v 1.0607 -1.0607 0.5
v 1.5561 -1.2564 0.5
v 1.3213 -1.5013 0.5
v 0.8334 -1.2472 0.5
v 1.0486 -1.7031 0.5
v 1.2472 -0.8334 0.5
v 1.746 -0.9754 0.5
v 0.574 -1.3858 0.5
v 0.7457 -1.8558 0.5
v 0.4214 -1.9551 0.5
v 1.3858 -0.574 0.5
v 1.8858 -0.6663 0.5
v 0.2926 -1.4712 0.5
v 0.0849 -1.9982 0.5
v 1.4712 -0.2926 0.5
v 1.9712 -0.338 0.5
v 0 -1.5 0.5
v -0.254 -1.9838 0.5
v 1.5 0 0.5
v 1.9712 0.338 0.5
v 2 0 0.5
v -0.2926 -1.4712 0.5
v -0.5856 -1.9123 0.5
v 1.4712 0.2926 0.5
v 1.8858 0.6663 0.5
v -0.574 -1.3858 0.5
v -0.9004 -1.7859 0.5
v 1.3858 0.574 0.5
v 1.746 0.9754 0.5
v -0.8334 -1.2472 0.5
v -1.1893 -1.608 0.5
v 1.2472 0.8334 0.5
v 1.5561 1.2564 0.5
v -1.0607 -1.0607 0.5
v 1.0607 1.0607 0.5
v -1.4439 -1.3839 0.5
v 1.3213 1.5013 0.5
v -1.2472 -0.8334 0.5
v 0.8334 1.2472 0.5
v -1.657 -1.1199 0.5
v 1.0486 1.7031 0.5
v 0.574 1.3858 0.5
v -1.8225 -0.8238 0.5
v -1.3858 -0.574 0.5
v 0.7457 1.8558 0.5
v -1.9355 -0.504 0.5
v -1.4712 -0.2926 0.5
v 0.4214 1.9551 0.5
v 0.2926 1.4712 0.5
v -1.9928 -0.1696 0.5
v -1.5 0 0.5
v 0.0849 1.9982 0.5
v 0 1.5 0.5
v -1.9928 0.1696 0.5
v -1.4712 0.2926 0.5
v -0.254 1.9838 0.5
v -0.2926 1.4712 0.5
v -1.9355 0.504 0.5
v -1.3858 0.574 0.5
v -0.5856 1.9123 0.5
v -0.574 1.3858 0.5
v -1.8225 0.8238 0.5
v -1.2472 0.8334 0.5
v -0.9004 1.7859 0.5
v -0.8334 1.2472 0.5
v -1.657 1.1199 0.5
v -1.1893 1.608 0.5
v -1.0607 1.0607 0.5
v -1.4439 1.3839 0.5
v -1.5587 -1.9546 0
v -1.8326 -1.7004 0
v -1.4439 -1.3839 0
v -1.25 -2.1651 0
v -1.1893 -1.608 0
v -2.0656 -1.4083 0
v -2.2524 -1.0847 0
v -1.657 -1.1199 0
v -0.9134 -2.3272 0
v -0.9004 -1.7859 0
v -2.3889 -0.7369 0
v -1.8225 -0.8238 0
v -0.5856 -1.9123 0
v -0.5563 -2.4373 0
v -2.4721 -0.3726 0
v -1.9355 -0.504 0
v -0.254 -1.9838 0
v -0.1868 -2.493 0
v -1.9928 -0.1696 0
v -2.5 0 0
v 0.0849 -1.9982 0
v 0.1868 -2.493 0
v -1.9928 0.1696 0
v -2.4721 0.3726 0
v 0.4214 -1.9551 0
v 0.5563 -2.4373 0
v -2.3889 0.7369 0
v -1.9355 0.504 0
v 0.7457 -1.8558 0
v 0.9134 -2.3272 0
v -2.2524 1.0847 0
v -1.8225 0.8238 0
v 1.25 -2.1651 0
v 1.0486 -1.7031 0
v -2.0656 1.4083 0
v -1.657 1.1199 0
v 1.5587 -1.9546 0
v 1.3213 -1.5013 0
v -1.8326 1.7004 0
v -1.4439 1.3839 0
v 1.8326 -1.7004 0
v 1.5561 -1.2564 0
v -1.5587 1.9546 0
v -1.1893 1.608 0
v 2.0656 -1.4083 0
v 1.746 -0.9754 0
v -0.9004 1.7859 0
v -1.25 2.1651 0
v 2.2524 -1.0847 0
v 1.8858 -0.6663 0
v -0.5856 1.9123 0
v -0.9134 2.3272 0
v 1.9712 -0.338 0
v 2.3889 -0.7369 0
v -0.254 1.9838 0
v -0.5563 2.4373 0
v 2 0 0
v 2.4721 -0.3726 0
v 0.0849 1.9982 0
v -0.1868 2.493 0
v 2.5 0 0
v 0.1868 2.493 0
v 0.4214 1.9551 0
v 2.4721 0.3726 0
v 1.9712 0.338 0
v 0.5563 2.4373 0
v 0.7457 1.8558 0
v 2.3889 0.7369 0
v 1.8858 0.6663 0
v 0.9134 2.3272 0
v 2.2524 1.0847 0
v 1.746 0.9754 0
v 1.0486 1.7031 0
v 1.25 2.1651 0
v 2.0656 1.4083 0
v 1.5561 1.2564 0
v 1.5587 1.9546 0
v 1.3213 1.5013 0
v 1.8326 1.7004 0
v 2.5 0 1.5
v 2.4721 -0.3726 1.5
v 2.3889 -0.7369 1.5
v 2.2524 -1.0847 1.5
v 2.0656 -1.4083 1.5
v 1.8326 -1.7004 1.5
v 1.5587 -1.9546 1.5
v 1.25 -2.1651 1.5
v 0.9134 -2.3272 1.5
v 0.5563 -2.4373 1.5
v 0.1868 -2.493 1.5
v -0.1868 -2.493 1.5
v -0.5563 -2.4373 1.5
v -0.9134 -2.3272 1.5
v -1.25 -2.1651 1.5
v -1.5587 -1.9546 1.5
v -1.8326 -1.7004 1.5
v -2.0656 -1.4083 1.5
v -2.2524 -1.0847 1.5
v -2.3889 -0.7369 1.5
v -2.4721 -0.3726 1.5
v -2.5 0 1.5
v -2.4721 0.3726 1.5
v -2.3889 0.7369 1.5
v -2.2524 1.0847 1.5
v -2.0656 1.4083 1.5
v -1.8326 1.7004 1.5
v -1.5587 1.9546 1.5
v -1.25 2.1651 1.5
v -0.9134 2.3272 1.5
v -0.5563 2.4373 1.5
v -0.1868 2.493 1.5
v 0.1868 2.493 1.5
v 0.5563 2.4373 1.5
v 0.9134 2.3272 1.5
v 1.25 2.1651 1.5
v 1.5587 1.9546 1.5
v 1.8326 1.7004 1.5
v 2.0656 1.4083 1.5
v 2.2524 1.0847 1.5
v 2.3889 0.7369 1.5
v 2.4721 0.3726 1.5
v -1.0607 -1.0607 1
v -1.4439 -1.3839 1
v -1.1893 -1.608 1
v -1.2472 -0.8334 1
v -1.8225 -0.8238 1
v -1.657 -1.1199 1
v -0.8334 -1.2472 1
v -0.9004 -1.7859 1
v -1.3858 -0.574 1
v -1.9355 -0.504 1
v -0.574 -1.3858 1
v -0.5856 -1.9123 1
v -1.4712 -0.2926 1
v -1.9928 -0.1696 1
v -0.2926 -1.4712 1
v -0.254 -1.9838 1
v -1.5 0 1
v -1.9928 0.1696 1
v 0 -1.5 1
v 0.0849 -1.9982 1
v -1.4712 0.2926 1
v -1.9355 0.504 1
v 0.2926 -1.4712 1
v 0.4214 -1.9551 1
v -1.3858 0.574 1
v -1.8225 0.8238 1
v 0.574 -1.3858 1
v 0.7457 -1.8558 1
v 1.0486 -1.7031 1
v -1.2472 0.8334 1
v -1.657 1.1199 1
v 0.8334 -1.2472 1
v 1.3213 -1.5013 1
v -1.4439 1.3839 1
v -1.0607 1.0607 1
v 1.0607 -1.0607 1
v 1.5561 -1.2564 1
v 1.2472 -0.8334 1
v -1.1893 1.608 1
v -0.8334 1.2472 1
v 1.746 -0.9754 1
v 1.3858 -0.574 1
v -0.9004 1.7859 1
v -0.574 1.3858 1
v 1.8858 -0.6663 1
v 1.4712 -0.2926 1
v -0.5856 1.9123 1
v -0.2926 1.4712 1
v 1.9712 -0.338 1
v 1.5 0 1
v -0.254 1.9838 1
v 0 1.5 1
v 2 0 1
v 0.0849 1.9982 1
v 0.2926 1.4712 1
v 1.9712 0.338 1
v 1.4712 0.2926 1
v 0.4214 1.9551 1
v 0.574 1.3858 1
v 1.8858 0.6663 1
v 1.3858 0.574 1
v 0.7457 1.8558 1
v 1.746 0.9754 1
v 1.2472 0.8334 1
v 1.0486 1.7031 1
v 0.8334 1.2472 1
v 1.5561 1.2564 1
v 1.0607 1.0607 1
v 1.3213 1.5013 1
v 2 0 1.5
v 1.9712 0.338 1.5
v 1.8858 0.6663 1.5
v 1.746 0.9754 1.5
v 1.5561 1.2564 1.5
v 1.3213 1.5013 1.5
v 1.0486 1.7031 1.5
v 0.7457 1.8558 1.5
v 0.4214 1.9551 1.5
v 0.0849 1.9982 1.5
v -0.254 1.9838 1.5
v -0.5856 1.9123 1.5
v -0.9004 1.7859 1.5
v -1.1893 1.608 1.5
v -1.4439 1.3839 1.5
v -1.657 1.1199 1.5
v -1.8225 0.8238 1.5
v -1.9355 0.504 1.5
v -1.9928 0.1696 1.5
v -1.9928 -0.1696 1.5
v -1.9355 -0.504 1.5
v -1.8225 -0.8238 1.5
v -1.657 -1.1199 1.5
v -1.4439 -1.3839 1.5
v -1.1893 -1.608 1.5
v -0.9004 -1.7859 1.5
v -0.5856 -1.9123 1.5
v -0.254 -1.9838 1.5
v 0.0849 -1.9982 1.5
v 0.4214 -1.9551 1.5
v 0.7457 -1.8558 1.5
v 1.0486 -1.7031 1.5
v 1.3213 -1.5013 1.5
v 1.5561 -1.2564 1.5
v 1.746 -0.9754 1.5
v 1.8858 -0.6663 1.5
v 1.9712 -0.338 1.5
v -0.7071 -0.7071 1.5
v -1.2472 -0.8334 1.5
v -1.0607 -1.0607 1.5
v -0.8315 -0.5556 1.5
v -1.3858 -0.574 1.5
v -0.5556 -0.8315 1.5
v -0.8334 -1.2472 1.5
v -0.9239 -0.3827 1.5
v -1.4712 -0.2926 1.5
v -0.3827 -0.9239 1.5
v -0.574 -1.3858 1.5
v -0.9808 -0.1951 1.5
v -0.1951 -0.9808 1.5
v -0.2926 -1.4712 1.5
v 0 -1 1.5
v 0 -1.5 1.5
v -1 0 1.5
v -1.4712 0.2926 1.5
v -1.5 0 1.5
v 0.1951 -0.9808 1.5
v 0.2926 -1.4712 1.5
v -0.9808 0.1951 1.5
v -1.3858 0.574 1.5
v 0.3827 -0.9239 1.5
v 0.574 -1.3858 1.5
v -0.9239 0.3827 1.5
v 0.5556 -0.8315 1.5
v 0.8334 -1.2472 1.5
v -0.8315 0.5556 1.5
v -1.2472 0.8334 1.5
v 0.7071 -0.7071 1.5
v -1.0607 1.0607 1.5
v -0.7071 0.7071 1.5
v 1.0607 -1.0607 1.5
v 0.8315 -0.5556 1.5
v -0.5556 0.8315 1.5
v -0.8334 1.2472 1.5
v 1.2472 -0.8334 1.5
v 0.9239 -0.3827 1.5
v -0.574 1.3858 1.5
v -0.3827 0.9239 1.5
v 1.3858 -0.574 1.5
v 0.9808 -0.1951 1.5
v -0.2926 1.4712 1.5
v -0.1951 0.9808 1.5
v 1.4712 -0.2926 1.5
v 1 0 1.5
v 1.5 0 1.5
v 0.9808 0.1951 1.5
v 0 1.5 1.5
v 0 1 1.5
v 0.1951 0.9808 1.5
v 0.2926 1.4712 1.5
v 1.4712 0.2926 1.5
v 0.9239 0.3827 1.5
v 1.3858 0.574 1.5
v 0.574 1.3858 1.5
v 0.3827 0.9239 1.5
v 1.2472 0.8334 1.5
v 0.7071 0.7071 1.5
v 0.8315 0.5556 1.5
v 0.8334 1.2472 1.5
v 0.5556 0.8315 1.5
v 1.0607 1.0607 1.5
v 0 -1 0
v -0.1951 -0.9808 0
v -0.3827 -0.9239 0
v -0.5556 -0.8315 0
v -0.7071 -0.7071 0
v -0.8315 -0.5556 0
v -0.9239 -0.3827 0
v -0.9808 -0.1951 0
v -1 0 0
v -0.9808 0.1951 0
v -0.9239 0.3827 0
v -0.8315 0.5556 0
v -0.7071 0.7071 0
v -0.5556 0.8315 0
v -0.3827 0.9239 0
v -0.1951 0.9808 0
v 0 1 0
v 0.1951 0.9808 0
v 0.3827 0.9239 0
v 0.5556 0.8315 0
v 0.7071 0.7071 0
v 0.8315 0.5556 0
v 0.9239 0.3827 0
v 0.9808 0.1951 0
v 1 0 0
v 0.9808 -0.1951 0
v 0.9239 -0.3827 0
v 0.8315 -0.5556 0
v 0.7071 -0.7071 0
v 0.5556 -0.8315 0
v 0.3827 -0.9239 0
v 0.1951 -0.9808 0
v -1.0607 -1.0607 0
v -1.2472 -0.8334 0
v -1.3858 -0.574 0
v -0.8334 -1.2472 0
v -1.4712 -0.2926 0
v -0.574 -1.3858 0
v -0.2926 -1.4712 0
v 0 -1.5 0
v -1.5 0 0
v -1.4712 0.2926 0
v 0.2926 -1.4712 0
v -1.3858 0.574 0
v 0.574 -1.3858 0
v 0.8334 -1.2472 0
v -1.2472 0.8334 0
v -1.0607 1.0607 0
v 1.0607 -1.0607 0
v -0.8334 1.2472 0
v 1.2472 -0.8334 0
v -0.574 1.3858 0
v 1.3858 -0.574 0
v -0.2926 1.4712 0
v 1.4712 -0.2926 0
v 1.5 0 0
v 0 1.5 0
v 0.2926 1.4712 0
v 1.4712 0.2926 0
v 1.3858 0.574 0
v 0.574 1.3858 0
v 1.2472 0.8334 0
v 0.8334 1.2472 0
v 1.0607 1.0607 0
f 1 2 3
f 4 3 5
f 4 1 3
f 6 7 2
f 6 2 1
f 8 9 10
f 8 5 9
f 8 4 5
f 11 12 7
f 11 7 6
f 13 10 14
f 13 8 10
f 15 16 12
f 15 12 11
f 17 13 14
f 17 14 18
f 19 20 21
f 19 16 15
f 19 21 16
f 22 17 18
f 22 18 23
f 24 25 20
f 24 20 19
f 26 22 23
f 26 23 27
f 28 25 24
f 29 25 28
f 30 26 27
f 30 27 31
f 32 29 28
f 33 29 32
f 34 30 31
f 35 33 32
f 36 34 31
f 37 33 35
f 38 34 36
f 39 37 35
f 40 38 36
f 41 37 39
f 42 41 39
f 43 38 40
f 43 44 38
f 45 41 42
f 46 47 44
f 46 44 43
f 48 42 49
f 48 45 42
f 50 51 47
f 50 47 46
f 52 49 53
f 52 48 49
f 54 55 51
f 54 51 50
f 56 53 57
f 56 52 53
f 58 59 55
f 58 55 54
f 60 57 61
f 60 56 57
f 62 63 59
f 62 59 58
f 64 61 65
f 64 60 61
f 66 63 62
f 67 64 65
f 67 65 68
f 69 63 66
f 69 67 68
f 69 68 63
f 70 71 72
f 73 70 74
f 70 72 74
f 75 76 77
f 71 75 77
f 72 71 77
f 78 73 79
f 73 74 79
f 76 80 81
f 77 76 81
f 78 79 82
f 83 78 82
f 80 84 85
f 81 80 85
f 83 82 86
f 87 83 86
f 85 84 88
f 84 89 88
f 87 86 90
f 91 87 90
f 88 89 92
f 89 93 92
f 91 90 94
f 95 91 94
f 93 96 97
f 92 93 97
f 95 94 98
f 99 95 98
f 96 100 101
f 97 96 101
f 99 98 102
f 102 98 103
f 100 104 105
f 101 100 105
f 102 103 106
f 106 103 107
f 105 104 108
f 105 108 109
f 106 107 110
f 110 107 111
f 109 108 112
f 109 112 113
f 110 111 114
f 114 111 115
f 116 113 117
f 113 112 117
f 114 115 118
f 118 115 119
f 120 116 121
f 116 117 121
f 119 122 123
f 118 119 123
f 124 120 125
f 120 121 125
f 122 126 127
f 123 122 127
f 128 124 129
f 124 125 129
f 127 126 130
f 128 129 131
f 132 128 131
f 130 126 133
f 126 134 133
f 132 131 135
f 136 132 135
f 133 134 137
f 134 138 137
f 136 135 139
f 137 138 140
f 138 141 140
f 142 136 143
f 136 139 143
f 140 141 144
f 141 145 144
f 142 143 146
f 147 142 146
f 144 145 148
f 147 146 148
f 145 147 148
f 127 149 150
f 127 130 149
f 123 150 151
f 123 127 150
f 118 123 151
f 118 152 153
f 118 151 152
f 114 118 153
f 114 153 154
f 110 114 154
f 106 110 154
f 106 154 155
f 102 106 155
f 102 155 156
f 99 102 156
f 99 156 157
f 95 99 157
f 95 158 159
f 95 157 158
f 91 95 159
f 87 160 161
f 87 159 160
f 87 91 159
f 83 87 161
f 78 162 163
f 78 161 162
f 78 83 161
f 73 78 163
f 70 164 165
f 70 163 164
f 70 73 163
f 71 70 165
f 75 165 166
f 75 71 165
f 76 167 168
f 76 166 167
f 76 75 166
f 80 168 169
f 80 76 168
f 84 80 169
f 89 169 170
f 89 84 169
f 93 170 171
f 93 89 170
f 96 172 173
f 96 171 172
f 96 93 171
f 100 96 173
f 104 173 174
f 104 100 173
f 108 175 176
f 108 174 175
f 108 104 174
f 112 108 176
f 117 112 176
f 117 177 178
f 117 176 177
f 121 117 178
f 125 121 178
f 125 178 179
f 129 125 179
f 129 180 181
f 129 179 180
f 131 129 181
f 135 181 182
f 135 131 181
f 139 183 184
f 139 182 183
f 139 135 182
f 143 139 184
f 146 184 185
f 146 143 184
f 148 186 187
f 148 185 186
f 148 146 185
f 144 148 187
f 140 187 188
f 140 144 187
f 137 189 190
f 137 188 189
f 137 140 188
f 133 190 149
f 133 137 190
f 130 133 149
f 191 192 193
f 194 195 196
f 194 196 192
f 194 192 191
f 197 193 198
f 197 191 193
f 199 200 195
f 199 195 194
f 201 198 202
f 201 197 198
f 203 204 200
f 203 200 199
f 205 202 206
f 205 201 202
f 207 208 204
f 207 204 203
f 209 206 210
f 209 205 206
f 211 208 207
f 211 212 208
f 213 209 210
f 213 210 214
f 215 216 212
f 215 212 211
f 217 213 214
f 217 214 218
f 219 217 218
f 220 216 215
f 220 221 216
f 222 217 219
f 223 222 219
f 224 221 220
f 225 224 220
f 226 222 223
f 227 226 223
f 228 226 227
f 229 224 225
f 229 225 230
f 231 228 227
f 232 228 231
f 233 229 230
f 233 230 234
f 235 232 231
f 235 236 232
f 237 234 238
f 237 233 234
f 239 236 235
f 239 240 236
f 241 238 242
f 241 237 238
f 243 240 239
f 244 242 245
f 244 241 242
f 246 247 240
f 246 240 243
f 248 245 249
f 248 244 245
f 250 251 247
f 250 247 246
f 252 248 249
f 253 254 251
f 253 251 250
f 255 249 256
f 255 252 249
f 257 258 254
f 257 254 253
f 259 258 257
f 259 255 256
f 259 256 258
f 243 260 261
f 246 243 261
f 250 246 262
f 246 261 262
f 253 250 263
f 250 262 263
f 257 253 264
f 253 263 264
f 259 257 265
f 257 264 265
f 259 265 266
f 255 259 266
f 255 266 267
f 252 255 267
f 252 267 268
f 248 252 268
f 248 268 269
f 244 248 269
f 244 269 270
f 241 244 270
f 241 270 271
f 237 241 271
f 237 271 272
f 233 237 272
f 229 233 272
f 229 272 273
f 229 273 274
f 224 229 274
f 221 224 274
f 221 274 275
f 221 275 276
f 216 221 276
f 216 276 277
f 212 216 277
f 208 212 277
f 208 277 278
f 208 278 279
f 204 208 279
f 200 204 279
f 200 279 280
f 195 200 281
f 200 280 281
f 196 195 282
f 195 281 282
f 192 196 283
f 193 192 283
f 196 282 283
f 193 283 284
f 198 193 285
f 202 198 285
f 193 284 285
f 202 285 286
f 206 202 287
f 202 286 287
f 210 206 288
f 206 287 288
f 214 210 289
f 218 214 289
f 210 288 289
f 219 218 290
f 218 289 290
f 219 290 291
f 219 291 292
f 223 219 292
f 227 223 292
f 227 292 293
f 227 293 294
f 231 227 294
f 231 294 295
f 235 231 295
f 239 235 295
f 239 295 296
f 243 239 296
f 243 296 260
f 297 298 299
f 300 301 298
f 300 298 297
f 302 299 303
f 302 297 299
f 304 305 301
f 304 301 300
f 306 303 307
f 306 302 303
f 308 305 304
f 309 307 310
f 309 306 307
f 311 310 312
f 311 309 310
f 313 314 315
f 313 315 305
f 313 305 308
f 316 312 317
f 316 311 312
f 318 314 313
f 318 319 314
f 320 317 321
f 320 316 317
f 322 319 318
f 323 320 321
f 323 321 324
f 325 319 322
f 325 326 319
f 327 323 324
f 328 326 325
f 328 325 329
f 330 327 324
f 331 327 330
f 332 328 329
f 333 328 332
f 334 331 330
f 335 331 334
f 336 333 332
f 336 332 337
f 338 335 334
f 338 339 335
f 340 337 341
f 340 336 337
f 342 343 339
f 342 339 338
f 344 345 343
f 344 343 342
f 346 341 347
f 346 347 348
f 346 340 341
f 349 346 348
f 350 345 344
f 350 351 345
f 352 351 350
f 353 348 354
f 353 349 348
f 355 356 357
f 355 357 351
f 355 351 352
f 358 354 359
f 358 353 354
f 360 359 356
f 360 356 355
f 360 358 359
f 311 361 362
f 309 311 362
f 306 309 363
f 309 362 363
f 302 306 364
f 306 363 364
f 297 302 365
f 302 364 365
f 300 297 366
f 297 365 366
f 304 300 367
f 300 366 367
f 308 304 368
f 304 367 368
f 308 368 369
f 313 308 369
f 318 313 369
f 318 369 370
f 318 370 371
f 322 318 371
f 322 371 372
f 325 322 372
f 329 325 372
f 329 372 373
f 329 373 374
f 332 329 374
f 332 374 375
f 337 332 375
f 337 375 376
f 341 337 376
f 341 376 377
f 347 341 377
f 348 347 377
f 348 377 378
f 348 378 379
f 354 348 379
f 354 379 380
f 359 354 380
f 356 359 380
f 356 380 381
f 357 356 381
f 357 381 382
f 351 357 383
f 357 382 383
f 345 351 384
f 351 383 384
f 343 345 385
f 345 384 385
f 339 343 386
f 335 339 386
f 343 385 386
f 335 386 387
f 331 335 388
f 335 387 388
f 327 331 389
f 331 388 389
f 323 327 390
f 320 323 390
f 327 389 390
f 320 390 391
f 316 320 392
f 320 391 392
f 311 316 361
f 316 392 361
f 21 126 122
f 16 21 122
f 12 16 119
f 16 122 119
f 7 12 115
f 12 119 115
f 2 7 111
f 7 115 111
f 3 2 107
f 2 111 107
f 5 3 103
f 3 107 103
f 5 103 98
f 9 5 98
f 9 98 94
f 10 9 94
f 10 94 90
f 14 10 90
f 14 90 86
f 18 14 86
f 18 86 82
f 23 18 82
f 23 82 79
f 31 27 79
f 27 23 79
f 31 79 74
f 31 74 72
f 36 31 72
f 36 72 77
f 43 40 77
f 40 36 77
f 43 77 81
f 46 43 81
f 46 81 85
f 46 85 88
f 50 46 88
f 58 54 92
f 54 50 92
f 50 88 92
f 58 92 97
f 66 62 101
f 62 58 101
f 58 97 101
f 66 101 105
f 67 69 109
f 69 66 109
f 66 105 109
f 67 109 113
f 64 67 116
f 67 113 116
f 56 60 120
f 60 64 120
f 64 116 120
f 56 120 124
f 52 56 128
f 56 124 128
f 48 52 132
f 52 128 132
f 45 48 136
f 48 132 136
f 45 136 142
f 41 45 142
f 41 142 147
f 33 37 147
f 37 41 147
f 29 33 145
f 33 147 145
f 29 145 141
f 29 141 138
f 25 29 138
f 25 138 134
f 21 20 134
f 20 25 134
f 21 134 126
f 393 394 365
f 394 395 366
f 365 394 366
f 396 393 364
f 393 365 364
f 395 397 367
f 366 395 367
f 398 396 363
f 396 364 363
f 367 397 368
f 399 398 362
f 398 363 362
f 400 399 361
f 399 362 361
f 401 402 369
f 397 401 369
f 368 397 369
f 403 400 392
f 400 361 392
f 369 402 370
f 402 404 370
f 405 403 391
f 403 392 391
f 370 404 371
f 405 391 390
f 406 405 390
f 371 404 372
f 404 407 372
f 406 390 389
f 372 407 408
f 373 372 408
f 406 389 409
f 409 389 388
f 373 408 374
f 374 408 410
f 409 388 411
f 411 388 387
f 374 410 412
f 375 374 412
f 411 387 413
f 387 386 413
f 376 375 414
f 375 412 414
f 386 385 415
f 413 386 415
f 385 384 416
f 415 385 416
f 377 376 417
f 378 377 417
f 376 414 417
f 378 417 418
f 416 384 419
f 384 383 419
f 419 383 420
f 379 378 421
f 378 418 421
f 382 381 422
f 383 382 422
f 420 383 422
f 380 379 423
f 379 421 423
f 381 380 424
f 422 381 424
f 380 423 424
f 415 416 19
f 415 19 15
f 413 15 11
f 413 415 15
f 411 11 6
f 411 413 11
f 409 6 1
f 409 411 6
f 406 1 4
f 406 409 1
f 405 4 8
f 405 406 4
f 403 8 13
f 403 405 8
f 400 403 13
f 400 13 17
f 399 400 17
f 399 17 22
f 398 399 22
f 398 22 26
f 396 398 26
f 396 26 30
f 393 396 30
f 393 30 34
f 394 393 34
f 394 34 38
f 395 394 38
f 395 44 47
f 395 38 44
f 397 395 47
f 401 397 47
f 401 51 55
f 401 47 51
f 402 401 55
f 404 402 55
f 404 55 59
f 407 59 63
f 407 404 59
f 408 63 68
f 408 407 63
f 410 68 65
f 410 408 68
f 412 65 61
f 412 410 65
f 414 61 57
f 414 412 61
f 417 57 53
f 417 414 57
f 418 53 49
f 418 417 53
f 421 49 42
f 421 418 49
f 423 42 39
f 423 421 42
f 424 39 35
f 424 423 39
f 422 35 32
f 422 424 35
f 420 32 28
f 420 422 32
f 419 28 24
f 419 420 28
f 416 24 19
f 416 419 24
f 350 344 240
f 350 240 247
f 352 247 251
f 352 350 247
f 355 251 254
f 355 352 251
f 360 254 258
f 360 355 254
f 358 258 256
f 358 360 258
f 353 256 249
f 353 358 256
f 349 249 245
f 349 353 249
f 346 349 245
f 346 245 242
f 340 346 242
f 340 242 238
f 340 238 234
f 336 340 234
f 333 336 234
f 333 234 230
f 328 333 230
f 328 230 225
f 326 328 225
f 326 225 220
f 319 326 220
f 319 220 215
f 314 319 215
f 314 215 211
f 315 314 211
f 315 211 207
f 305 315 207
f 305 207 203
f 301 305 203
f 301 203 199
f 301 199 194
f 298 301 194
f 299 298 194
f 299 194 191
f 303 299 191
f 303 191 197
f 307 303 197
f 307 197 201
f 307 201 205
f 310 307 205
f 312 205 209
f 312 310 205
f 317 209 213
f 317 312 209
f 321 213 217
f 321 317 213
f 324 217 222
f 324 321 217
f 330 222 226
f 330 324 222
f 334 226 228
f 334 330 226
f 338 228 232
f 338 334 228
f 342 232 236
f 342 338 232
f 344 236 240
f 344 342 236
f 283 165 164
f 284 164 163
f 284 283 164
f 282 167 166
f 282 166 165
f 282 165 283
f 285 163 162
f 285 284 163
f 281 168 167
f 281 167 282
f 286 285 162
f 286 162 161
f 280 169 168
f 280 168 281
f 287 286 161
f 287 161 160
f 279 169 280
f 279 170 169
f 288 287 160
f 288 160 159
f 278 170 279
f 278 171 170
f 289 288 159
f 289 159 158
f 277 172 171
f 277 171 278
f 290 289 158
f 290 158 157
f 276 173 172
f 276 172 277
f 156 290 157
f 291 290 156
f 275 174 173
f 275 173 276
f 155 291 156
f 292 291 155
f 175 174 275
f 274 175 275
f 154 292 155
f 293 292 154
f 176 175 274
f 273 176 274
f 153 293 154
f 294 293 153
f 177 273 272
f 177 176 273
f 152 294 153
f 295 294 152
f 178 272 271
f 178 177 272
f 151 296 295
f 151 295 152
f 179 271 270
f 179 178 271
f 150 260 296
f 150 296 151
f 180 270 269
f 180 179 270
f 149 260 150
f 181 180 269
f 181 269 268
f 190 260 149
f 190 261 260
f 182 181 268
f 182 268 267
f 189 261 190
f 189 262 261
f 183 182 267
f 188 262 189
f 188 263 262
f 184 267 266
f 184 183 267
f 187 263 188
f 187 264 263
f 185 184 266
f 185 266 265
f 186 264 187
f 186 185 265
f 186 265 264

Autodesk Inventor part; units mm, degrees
ref_plane "YZ Plane" through (0, 0, 0) normal (1, 0, 0) x (0, 1, 0)
ref_plane "XZ Plane" through (0, 0, 0) normal (0, 1, 0) x (-1, 0, 0)
sketch "Sketch1" plane through (0, 0, 0) normal (0, 0, 1) x (1, 0, 0)
  circle A0 centre (0, 0) radius 2.5
  dimension "d0" = 5
extrude "Extrusion1" add sketch "Sketch1" along normal blind 1.5
hole "Hole1" at (0, 0, 1.5) direction (0, 0, -1) diameter 2 end through all
sketch "Sketch2" plane through (0, 0, 1.5) normal (0, 0, 1) x (1, 0, 0)
  circle A0 centre (0, 0) radius 2
  circle A1 centre (0, 0) radius 1.5
  dimension "d12" = 4
  dimension "d13" = 3
extrude "Extrusion2" cut sketch "Sketch2" against normal blind 0.5
ref_plane "Work Plane1" through (0, 0, 0.75) normal (0, 0, 1) x (1, 0, 0)
mirror "Mirror1" about plane through (0, 0, 0.75) normal (0, 0, 1) of "Extrusion2"
properties part number "bearing_2x5x1,5" material "Stainless Steel"
